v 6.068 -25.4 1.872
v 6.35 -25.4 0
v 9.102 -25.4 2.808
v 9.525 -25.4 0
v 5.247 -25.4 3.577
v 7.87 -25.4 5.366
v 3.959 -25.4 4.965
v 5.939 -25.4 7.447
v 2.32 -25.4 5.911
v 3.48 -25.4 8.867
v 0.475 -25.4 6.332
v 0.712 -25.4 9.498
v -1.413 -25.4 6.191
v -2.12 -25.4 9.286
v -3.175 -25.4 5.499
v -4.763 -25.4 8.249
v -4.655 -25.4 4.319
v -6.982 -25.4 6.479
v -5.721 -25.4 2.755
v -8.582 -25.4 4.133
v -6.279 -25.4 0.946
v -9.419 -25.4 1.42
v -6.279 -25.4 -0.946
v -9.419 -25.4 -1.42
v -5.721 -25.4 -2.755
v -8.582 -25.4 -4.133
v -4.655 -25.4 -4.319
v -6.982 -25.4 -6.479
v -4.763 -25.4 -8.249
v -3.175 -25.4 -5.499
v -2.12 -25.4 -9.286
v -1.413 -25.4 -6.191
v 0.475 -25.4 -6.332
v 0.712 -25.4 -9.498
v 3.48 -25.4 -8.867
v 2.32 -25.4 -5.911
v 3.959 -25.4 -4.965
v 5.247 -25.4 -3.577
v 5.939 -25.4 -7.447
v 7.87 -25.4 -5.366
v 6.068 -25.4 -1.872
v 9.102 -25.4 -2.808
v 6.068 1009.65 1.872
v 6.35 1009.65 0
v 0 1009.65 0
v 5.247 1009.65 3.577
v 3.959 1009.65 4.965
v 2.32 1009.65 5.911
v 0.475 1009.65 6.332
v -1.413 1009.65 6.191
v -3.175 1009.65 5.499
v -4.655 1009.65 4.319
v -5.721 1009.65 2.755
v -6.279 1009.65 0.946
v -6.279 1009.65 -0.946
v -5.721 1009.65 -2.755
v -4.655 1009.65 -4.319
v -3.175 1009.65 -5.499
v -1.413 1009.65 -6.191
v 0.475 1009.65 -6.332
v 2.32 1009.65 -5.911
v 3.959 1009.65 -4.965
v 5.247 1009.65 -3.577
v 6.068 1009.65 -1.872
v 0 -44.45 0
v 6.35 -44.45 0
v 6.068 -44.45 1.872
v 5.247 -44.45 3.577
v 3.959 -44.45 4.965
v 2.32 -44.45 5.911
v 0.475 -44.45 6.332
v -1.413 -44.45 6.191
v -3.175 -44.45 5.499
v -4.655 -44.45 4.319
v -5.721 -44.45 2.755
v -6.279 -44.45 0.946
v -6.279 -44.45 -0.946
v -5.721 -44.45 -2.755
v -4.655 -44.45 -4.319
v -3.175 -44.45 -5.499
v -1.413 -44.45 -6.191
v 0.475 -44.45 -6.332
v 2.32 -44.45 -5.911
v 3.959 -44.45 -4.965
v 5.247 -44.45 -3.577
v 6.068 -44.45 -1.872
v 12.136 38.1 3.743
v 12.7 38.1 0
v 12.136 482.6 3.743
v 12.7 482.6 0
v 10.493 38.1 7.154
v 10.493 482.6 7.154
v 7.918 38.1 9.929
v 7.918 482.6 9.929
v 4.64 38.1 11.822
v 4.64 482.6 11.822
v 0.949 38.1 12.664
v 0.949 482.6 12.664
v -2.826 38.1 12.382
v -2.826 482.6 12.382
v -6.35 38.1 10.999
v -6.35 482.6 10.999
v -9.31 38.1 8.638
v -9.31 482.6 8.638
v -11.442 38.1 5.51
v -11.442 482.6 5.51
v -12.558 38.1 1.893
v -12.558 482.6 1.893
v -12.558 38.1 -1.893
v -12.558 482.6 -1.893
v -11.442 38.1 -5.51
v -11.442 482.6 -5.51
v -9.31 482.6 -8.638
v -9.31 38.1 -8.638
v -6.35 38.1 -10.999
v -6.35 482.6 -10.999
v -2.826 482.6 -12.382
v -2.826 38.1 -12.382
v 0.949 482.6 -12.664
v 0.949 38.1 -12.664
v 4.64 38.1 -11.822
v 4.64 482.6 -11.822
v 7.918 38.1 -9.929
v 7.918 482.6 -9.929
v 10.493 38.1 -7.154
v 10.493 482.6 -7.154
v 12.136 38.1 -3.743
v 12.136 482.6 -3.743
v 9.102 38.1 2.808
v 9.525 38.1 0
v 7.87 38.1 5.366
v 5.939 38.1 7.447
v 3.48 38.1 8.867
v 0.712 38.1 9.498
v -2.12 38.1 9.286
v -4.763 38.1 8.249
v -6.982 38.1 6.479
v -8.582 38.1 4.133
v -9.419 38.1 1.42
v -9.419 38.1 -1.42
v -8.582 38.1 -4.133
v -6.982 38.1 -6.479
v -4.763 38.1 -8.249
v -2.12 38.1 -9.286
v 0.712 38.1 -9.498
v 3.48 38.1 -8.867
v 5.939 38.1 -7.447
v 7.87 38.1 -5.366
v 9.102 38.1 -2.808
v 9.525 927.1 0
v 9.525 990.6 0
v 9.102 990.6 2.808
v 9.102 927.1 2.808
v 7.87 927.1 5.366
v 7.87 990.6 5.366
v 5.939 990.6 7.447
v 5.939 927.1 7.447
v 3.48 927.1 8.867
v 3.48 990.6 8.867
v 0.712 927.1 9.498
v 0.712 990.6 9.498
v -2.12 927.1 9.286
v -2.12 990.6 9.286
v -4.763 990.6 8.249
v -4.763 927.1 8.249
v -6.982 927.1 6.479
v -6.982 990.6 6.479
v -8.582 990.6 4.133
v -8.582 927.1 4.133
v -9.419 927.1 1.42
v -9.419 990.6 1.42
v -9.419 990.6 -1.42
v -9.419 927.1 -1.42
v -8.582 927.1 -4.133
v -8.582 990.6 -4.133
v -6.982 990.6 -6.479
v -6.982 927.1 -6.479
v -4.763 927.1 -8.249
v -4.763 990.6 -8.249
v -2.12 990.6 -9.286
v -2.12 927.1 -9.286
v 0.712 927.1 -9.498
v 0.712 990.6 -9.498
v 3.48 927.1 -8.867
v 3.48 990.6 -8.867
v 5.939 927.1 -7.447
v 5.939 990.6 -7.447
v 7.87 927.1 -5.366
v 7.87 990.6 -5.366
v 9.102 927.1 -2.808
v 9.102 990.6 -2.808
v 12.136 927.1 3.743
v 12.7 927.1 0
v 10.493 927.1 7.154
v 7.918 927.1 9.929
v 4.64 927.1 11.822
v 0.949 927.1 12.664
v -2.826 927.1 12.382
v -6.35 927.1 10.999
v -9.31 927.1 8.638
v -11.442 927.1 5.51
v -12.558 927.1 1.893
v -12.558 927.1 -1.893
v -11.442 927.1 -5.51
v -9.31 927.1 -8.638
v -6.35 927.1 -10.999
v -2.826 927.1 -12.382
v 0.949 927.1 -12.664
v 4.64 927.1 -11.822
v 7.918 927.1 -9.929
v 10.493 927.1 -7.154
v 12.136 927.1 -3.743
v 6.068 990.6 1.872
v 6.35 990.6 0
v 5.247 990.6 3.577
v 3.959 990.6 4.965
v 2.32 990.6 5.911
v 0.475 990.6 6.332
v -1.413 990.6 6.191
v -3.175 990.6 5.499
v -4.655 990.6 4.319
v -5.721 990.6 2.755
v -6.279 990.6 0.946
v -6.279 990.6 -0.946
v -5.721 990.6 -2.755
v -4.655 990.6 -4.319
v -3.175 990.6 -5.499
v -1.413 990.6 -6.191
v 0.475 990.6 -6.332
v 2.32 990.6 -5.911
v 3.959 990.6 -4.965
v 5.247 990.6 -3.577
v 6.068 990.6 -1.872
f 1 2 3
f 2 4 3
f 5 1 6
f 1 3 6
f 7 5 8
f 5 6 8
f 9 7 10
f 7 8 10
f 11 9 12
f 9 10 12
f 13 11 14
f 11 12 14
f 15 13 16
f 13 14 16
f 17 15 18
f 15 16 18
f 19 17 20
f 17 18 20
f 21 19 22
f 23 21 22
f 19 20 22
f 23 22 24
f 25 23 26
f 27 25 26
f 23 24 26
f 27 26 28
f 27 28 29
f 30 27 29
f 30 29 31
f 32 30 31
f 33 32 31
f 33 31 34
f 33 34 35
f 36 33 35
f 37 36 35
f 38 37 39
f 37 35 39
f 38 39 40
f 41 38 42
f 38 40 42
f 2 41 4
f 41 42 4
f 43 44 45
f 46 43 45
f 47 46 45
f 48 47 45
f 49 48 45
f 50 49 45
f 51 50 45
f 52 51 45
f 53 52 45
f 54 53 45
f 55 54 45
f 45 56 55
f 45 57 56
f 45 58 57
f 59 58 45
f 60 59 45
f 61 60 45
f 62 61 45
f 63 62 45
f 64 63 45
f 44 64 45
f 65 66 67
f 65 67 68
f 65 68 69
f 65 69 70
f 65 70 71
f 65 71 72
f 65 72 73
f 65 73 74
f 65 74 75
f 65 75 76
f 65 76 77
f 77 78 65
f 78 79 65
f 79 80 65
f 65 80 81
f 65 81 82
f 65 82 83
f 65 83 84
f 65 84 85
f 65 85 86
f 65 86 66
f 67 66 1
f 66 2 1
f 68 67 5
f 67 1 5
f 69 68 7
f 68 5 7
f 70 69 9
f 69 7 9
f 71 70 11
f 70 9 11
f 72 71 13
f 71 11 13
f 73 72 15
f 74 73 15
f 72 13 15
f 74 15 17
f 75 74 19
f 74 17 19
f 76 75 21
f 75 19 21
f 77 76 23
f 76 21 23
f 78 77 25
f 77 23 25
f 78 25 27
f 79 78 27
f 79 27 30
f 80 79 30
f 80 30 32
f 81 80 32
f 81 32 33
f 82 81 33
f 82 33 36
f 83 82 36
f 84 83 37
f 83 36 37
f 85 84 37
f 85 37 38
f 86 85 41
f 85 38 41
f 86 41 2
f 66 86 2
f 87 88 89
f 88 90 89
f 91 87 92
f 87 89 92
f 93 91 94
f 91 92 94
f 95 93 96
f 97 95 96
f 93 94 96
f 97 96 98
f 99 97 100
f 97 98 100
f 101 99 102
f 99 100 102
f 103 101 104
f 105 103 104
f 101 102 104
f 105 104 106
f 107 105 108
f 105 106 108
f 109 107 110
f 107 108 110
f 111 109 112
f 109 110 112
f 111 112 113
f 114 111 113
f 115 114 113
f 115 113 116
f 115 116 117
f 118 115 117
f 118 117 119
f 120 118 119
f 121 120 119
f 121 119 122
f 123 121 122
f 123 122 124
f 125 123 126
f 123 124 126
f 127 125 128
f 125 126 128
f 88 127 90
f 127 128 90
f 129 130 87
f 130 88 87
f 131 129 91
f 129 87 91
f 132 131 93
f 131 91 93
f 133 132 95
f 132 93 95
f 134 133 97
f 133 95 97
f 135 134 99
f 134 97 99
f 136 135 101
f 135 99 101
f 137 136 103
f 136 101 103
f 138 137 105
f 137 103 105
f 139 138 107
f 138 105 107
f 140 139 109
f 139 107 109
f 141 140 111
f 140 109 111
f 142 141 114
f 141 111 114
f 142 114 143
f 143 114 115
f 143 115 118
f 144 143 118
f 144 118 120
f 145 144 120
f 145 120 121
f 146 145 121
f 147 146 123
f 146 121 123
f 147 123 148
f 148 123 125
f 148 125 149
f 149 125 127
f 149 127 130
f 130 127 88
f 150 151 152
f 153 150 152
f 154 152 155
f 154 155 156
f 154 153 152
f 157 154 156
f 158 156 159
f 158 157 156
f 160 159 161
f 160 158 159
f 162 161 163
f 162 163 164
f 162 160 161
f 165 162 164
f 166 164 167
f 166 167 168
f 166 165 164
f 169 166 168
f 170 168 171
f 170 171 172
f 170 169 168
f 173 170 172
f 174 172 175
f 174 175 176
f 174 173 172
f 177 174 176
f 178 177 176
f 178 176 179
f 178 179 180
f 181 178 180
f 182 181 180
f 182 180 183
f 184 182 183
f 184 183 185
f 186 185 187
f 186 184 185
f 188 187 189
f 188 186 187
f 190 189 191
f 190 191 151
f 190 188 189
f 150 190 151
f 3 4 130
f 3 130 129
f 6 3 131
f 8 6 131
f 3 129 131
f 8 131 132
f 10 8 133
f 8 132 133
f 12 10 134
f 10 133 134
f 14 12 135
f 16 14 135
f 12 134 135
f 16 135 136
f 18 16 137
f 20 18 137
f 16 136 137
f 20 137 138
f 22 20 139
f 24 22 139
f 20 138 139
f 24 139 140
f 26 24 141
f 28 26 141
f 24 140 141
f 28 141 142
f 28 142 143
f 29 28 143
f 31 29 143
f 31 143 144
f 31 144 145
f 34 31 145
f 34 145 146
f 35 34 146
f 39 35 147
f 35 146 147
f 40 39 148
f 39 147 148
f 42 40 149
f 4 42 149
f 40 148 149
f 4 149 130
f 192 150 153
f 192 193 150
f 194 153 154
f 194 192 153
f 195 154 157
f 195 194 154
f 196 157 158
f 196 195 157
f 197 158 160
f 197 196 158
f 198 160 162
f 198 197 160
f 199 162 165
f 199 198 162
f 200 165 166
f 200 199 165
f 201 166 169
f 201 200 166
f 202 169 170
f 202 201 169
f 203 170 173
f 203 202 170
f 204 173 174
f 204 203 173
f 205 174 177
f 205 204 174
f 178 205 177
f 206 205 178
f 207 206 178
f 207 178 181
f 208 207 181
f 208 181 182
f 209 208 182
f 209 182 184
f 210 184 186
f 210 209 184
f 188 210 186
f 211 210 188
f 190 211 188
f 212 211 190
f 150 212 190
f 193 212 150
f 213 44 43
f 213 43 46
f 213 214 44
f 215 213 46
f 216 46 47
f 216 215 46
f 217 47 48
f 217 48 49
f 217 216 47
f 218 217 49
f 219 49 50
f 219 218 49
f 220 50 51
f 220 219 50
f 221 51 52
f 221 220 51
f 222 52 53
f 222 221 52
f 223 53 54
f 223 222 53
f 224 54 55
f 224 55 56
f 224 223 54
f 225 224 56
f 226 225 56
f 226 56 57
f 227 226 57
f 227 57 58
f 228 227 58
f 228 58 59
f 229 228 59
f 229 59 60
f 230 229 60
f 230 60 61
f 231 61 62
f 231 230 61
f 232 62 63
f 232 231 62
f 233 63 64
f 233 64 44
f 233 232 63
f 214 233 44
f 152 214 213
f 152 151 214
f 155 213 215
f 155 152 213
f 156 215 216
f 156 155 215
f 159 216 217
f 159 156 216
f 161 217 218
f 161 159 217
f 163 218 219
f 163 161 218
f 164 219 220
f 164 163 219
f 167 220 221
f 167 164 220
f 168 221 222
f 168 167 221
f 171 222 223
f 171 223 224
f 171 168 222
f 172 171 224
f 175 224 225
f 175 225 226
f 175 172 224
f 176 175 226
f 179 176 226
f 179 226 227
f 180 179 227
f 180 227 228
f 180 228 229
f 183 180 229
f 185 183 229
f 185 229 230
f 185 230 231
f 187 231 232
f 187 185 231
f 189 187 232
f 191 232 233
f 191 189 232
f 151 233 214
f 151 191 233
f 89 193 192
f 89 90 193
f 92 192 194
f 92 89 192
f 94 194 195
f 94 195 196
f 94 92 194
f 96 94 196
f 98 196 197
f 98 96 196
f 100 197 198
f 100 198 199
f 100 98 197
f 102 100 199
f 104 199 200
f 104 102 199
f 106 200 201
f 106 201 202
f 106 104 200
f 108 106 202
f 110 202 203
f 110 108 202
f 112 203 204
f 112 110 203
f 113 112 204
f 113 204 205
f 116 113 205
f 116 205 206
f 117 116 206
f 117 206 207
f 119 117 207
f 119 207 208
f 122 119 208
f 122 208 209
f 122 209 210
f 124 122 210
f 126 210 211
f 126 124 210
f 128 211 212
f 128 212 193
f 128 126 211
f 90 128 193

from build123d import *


with BuildPart() as f3:
    # F3: sweep along a path in F1
    with BuildLine(Plane.XZ) as f3_path:
        CenterArc((0, 0), 17.204414341, 0, 360)
    # F0 (on Right) → F3 (sweep)
    with BuildSketch(Plane.YZ):
        Polygon((-25.4, -6.35), (-25.4, -9.525), (38.1, -9.525), (38.1, -12.7), (482.6, -12.7), (482.6, 0), (-44.45, 0), (-44.45, -6.35), align=None)
    sweep(path=f3_path.line)

    # F4: F3 across plane


with BuildPart() as f3_1:
    add(f3.part)
    add(f3.part.mirror(Plane(origin=(0, 482.6, 0), x_dir=(-1, 0, 0), z_dir=(0, 1, 0))))


solid = f3_1.part
